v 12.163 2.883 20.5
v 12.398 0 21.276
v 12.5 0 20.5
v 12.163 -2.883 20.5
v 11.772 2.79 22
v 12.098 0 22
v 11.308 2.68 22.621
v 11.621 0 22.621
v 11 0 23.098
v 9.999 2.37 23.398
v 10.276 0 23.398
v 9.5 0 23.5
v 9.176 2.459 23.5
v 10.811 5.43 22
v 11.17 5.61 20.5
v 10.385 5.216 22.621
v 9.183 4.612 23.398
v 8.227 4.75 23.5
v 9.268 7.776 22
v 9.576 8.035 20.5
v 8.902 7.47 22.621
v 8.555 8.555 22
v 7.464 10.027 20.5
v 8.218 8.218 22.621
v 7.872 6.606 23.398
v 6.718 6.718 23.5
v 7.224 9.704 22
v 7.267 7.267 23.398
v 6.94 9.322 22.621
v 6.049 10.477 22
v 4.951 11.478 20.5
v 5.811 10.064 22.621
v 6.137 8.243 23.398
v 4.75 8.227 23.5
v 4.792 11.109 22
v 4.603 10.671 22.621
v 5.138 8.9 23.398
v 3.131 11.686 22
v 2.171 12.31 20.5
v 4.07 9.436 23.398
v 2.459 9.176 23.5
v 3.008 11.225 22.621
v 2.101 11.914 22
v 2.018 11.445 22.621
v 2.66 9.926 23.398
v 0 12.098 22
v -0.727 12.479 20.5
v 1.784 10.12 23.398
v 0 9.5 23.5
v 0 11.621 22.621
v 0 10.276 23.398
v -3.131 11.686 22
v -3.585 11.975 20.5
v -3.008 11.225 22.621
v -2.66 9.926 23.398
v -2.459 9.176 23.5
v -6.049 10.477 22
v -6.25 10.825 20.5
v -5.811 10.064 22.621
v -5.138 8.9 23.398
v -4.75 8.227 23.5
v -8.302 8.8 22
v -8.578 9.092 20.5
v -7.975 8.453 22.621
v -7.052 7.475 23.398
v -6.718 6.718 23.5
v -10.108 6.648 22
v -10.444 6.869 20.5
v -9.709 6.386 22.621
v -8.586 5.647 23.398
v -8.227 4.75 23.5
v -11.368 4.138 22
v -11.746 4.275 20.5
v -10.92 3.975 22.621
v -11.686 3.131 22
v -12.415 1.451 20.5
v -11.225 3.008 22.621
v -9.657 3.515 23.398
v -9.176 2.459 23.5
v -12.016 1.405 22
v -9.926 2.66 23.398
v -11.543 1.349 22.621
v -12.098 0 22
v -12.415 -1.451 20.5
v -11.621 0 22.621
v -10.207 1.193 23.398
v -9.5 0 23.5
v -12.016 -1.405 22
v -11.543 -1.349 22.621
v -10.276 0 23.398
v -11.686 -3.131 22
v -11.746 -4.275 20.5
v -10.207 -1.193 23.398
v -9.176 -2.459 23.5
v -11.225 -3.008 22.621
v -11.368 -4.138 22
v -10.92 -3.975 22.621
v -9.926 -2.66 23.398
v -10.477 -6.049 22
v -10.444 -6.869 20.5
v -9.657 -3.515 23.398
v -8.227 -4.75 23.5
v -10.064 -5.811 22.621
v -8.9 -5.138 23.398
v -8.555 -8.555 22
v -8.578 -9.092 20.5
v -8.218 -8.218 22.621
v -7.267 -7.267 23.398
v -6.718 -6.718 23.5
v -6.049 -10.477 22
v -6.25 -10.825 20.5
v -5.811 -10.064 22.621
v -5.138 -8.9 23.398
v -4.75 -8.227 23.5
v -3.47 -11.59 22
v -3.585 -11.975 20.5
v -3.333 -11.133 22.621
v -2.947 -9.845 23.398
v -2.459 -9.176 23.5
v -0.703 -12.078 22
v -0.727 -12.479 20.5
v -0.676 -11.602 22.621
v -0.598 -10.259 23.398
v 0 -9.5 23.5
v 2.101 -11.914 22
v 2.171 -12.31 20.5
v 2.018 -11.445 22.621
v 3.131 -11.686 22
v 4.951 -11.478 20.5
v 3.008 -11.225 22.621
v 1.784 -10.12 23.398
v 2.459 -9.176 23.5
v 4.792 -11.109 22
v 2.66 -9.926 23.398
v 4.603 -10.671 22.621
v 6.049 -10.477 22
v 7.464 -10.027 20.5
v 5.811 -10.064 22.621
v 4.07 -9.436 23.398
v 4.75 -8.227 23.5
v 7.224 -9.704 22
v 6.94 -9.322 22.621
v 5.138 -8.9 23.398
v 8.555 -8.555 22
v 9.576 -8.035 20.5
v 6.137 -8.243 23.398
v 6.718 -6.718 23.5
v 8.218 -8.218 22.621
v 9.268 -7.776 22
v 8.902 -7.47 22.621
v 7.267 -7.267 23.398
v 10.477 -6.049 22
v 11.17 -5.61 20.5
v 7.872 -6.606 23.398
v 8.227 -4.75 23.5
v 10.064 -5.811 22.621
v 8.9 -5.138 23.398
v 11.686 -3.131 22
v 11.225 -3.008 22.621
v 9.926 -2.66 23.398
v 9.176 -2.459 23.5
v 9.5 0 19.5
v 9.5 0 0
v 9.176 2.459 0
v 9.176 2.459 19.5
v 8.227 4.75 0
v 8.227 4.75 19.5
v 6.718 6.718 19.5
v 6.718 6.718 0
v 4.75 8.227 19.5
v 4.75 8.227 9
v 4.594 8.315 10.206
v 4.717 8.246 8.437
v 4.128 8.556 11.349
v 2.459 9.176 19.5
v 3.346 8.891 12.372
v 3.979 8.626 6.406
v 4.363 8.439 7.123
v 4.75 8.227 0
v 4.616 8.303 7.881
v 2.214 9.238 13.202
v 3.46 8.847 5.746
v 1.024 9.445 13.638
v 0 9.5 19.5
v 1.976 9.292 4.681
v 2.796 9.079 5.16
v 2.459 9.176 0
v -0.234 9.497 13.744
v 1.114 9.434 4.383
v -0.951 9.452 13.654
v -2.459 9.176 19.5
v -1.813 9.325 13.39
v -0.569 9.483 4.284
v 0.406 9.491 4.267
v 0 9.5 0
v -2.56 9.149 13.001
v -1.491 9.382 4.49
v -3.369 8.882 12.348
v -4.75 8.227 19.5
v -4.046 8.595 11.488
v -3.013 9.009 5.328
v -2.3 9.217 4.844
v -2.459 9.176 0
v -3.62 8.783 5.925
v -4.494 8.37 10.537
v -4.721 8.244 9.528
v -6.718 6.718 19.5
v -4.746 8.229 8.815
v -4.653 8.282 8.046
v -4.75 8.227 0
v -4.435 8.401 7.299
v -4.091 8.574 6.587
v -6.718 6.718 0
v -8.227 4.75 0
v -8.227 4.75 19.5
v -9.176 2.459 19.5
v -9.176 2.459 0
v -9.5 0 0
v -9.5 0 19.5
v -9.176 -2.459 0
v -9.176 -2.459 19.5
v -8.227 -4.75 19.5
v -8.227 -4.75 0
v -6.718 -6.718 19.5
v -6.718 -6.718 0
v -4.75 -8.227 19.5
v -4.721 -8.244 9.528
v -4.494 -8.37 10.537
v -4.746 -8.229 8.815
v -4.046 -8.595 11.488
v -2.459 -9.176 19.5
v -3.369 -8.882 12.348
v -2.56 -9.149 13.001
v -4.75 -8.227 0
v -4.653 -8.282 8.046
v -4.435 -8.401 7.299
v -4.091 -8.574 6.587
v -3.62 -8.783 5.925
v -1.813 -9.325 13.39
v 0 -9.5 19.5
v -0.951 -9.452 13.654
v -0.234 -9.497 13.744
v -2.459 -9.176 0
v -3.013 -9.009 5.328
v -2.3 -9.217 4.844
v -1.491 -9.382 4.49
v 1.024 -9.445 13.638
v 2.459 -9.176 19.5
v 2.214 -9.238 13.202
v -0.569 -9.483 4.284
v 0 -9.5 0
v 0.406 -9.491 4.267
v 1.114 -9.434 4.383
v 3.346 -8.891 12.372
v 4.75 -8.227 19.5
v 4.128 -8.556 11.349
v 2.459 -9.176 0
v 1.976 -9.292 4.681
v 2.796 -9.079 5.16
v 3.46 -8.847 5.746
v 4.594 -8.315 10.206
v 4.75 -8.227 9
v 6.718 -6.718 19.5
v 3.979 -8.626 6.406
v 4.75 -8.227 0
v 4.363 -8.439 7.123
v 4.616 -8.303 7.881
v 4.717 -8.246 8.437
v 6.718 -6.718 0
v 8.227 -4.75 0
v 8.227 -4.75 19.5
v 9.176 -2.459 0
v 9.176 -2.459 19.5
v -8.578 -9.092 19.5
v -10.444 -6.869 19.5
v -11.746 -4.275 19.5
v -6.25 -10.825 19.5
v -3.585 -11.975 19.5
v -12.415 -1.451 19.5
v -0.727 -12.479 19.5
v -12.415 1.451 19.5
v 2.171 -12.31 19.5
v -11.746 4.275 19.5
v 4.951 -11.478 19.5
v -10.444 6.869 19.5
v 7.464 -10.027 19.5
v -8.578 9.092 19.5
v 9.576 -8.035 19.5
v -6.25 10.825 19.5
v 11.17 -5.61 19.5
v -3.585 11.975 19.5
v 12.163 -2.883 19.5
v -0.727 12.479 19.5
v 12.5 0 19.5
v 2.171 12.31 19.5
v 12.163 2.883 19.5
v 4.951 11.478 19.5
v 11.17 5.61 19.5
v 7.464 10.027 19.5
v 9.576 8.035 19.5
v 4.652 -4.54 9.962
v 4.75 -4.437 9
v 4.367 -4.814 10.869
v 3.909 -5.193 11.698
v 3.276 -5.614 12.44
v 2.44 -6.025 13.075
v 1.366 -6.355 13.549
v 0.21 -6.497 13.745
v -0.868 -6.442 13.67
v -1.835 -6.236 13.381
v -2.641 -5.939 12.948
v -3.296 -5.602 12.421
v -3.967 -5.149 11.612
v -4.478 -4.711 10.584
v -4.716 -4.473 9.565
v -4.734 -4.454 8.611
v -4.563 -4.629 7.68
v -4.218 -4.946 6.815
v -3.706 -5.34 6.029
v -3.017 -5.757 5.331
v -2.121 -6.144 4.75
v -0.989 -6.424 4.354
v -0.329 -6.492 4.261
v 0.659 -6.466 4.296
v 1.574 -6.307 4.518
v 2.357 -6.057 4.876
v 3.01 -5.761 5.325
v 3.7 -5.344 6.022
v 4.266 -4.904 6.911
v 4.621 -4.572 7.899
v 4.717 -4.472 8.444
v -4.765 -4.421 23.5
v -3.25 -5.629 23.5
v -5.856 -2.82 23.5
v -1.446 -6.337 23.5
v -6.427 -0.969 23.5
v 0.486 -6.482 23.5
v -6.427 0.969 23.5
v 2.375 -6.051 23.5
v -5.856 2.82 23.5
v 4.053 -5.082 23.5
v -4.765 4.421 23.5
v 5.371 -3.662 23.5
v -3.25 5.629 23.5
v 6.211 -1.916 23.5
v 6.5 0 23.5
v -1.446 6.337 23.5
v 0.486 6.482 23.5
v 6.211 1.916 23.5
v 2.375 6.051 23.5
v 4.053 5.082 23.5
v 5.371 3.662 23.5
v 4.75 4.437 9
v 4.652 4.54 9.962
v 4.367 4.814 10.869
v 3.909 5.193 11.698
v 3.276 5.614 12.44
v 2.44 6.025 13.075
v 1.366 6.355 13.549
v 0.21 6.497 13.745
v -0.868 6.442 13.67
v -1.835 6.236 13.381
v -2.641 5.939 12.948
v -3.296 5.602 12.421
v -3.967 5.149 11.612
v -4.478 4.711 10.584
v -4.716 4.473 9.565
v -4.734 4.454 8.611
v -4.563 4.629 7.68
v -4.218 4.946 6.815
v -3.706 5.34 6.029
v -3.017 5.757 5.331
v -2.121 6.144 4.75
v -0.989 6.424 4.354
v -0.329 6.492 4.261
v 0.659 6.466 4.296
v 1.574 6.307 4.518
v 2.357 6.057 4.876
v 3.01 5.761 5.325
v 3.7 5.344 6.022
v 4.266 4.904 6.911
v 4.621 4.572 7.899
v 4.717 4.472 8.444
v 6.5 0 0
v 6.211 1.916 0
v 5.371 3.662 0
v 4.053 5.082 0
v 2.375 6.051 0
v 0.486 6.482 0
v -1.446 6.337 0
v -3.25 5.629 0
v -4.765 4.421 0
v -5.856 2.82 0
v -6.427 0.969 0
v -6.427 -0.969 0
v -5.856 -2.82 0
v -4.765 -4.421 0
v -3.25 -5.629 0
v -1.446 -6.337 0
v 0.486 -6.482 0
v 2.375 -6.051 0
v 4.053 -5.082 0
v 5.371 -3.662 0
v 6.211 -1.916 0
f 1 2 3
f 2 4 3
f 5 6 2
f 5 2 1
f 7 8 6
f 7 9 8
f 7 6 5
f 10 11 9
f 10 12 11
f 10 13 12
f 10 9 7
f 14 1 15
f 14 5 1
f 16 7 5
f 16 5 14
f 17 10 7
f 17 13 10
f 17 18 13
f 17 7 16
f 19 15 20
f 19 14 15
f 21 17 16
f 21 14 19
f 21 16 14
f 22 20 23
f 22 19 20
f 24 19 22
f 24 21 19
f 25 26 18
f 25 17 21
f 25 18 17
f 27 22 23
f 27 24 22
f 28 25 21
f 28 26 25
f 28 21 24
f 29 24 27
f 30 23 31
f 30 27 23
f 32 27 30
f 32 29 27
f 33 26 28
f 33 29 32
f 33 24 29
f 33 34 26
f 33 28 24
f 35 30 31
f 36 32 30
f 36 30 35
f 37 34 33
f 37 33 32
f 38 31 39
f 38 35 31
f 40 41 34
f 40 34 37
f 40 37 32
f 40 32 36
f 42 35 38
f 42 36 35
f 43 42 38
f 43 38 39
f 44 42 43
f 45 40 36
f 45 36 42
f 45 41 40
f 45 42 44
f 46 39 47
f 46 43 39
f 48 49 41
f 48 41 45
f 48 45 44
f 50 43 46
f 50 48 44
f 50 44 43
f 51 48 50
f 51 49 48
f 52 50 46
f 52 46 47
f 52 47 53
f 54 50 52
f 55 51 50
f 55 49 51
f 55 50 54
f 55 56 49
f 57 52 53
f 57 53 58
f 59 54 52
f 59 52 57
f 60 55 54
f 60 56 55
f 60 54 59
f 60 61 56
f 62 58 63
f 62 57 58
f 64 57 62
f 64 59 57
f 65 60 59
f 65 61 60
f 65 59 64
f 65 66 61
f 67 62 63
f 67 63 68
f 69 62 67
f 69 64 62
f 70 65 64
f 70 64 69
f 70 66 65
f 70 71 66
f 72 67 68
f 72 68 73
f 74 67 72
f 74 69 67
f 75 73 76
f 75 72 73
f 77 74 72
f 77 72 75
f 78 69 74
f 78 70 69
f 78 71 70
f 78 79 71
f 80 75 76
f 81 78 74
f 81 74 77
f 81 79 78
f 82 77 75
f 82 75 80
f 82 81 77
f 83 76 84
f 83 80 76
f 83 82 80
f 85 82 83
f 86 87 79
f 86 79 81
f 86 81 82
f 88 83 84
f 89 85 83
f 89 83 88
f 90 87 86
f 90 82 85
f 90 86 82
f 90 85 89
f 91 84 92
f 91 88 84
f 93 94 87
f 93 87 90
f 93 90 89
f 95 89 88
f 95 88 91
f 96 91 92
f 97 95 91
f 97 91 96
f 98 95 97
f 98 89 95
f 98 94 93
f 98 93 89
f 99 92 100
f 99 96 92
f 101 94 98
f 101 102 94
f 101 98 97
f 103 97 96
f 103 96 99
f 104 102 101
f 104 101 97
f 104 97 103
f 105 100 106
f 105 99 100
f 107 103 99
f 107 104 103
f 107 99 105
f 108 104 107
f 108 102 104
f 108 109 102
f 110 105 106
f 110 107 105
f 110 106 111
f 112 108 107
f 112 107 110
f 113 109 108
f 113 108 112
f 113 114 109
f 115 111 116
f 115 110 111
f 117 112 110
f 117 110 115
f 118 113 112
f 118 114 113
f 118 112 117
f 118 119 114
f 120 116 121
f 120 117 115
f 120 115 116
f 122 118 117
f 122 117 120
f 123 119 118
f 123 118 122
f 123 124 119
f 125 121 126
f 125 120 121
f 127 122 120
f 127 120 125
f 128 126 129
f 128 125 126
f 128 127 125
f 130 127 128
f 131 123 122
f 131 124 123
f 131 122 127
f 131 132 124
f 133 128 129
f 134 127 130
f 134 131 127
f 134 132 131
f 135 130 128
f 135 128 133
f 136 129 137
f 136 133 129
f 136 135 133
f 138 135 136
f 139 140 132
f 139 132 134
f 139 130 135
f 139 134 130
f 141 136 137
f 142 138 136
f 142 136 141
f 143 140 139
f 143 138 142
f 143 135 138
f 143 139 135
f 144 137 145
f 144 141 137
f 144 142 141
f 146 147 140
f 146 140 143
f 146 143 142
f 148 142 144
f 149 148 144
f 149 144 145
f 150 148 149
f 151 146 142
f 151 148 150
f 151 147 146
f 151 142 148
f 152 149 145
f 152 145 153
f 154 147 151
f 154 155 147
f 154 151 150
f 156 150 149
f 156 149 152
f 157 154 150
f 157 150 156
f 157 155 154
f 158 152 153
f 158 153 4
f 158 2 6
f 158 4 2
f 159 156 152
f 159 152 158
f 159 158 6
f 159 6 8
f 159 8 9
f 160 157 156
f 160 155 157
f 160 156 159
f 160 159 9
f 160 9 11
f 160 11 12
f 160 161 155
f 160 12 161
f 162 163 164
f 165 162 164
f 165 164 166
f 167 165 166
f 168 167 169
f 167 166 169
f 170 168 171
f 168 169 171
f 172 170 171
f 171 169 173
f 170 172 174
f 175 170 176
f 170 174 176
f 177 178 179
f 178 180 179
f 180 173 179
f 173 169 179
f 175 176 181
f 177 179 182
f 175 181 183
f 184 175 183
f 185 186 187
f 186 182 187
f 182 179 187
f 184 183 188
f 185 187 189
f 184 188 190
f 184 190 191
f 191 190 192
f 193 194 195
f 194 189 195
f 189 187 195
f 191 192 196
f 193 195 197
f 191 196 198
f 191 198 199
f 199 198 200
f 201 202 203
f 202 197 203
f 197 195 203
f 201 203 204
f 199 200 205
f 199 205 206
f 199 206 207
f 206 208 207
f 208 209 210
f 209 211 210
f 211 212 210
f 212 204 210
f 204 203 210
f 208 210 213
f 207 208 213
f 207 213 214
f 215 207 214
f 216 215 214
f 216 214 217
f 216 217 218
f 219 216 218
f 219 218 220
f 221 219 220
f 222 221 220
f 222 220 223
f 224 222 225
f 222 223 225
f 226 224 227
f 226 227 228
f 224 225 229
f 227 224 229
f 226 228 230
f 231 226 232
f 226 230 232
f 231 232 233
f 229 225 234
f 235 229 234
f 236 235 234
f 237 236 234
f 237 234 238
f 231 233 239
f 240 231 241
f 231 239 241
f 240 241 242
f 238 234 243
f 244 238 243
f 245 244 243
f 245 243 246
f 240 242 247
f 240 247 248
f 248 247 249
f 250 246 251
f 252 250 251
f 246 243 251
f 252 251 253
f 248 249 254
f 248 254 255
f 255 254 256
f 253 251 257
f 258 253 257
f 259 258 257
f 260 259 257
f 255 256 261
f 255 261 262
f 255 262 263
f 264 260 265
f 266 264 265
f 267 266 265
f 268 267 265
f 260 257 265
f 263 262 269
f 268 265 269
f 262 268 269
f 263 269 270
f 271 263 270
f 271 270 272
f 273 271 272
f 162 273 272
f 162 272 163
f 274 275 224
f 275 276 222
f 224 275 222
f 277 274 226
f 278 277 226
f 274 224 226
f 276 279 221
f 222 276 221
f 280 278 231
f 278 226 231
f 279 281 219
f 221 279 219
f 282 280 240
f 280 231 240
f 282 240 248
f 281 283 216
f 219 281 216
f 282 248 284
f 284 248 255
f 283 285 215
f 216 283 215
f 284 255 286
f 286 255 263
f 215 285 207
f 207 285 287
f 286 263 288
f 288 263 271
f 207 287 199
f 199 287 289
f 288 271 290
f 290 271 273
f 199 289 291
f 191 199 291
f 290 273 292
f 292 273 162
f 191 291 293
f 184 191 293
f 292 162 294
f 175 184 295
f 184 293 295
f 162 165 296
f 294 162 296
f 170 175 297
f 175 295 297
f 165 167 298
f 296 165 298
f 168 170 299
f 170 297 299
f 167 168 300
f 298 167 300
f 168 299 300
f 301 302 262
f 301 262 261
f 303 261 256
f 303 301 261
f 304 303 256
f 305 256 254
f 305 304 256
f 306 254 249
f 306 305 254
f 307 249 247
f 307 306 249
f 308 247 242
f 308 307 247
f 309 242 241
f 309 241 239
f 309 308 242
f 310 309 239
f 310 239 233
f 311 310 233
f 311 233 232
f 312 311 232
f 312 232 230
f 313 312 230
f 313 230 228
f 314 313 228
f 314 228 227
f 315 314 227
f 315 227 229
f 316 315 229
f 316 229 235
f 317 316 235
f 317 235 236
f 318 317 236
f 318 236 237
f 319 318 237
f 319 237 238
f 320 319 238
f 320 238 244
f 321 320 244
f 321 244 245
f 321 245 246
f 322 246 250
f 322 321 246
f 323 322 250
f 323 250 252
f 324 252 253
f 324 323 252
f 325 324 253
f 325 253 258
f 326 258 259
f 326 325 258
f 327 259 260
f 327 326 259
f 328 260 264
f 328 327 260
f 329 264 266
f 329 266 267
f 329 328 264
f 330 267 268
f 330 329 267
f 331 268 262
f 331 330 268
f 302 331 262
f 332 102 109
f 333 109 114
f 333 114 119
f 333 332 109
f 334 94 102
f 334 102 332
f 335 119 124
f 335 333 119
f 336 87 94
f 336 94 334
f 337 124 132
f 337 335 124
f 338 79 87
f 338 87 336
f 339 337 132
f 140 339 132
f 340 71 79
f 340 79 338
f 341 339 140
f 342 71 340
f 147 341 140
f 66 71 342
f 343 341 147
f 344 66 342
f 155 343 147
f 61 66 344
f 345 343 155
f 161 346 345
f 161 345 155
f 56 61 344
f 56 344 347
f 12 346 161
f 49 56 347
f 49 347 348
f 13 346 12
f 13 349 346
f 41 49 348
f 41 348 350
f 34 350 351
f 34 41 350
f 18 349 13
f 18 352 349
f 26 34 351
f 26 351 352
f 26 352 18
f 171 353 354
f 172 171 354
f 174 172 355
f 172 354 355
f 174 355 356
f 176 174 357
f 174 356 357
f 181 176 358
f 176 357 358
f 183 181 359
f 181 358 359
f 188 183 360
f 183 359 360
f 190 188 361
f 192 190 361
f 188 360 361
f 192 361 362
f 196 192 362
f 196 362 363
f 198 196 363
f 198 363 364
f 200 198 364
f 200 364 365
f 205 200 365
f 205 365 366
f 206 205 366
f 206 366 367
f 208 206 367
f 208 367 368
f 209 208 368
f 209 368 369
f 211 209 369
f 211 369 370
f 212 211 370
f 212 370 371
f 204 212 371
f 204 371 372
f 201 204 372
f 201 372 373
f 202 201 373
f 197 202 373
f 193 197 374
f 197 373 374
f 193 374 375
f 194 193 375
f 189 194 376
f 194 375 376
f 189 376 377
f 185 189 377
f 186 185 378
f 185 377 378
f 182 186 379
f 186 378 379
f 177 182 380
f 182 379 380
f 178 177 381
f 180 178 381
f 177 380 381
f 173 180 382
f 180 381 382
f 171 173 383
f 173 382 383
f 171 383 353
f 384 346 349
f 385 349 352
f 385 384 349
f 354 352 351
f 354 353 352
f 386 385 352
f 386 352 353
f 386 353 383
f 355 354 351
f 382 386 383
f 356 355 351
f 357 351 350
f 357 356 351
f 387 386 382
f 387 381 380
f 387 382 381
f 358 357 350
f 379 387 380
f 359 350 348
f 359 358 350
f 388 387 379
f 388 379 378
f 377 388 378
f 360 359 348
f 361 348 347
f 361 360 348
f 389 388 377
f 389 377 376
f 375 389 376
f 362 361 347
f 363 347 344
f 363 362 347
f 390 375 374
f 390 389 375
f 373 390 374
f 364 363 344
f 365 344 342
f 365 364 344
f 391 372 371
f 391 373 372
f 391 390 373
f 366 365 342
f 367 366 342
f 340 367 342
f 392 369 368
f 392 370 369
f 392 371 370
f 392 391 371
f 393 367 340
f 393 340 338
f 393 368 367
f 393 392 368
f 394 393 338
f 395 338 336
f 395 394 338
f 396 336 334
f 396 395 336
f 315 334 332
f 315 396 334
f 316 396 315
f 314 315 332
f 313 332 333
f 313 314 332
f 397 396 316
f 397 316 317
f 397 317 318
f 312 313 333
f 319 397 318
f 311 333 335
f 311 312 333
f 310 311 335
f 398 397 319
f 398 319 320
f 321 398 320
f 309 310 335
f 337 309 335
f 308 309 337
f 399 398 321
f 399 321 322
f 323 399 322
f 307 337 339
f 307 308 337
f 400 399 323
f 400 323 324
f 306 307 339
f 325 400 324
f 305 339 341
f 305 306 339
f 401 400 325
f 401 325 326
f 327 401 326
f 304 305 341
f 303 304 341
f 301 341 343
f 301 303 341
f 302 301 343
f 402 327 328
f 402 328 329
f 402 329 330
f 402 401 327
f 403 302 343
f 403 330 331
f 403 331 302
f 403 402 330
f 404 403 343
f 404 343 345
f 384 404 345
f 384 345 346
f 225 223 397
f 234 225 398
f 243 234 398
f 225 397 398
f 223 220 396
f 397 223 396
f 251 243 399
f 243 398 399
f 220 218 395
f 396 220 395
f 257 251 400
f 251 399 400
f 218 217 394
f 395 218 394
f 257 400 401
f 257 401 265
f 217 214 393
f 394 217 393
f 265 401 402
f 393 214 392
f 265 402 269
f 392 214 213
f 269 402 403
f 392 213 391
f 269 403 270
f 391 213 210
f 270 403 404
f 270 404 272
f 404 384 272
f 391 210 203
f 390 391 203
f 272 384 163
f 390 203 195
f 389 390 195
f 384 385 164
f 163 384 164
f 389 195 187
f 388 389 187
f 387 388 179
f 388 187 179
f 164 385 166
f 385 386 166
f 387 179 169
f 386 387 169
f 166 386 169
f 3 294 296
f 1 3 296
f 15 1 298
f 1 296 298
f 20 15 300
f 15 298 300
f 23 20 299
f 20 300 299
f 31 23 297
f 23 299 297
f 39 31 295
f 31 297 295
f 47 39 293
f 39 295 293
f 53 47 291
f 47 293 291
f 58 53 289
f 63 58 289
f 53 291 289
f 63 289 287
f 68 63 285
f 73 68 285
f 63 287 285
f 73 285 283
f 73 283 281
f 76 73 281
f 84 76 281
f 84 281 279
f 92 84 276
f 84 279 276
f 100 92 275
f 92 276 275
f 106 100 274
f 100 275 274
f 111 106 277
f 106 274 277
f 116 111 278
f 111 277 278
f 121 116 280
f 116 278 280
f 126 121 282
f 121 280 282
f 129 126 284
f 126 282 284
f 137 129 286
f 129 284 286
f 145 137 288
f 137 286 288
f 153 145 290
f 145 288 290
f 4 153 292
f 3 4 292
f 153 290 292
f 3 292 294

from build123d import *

# Parameters (mm, degrees)
F0_R          = 9.5
F0_R_2        = 6.5
F1_DEPTH      = 19.5
F2_R          = 12.5
F2_R_2        = 6.5
F3_DEPTH      = 4
F4_R          = 3
F5_R          = 4.75
F6_DEPTH      = 25
F6_DEPTH_BACK = 25


with BuildPart() as f1:
    # F0 (on Top) → F1 (new body)
    with BuildSketch(Plane.XY):
        Circle(F0_R)
        Circle(F0_R_2, mode=Mode.SUBTRACT)
    extrude(amount=F1_DEPTH)

    # F2 (on face) → F3 (join)
    with BuildSketch(Plane.XY.offset(19.5)):
        Circle(F2_R)
        Circle(F2_R_2, mode=Mode.SUBTRACT)
    extrude(amount=F3_DEPTH)

    # F4
    f4_edges = [f1.edges().sort_by_distance(p)[0] for p in [
        (-12.5, 0, 23.5),
    ]]
    fillet(f4_edges, radius=F4_R)

    # F5 (on Front) → F6 (cut, two sides)
    with BuildSketch(Plane.XZ) as f6_sk:
        with Locations((0, 9)):
            Circle(F5_R)
    extrude(amount=-F6_DEPTH, mode=Mode.SUBTRACT)
    extrude(f6_sk.sketch, amount=F6_DEPTH_BACK, mode=Mode.SUBTRACT)


solid = f1.part
